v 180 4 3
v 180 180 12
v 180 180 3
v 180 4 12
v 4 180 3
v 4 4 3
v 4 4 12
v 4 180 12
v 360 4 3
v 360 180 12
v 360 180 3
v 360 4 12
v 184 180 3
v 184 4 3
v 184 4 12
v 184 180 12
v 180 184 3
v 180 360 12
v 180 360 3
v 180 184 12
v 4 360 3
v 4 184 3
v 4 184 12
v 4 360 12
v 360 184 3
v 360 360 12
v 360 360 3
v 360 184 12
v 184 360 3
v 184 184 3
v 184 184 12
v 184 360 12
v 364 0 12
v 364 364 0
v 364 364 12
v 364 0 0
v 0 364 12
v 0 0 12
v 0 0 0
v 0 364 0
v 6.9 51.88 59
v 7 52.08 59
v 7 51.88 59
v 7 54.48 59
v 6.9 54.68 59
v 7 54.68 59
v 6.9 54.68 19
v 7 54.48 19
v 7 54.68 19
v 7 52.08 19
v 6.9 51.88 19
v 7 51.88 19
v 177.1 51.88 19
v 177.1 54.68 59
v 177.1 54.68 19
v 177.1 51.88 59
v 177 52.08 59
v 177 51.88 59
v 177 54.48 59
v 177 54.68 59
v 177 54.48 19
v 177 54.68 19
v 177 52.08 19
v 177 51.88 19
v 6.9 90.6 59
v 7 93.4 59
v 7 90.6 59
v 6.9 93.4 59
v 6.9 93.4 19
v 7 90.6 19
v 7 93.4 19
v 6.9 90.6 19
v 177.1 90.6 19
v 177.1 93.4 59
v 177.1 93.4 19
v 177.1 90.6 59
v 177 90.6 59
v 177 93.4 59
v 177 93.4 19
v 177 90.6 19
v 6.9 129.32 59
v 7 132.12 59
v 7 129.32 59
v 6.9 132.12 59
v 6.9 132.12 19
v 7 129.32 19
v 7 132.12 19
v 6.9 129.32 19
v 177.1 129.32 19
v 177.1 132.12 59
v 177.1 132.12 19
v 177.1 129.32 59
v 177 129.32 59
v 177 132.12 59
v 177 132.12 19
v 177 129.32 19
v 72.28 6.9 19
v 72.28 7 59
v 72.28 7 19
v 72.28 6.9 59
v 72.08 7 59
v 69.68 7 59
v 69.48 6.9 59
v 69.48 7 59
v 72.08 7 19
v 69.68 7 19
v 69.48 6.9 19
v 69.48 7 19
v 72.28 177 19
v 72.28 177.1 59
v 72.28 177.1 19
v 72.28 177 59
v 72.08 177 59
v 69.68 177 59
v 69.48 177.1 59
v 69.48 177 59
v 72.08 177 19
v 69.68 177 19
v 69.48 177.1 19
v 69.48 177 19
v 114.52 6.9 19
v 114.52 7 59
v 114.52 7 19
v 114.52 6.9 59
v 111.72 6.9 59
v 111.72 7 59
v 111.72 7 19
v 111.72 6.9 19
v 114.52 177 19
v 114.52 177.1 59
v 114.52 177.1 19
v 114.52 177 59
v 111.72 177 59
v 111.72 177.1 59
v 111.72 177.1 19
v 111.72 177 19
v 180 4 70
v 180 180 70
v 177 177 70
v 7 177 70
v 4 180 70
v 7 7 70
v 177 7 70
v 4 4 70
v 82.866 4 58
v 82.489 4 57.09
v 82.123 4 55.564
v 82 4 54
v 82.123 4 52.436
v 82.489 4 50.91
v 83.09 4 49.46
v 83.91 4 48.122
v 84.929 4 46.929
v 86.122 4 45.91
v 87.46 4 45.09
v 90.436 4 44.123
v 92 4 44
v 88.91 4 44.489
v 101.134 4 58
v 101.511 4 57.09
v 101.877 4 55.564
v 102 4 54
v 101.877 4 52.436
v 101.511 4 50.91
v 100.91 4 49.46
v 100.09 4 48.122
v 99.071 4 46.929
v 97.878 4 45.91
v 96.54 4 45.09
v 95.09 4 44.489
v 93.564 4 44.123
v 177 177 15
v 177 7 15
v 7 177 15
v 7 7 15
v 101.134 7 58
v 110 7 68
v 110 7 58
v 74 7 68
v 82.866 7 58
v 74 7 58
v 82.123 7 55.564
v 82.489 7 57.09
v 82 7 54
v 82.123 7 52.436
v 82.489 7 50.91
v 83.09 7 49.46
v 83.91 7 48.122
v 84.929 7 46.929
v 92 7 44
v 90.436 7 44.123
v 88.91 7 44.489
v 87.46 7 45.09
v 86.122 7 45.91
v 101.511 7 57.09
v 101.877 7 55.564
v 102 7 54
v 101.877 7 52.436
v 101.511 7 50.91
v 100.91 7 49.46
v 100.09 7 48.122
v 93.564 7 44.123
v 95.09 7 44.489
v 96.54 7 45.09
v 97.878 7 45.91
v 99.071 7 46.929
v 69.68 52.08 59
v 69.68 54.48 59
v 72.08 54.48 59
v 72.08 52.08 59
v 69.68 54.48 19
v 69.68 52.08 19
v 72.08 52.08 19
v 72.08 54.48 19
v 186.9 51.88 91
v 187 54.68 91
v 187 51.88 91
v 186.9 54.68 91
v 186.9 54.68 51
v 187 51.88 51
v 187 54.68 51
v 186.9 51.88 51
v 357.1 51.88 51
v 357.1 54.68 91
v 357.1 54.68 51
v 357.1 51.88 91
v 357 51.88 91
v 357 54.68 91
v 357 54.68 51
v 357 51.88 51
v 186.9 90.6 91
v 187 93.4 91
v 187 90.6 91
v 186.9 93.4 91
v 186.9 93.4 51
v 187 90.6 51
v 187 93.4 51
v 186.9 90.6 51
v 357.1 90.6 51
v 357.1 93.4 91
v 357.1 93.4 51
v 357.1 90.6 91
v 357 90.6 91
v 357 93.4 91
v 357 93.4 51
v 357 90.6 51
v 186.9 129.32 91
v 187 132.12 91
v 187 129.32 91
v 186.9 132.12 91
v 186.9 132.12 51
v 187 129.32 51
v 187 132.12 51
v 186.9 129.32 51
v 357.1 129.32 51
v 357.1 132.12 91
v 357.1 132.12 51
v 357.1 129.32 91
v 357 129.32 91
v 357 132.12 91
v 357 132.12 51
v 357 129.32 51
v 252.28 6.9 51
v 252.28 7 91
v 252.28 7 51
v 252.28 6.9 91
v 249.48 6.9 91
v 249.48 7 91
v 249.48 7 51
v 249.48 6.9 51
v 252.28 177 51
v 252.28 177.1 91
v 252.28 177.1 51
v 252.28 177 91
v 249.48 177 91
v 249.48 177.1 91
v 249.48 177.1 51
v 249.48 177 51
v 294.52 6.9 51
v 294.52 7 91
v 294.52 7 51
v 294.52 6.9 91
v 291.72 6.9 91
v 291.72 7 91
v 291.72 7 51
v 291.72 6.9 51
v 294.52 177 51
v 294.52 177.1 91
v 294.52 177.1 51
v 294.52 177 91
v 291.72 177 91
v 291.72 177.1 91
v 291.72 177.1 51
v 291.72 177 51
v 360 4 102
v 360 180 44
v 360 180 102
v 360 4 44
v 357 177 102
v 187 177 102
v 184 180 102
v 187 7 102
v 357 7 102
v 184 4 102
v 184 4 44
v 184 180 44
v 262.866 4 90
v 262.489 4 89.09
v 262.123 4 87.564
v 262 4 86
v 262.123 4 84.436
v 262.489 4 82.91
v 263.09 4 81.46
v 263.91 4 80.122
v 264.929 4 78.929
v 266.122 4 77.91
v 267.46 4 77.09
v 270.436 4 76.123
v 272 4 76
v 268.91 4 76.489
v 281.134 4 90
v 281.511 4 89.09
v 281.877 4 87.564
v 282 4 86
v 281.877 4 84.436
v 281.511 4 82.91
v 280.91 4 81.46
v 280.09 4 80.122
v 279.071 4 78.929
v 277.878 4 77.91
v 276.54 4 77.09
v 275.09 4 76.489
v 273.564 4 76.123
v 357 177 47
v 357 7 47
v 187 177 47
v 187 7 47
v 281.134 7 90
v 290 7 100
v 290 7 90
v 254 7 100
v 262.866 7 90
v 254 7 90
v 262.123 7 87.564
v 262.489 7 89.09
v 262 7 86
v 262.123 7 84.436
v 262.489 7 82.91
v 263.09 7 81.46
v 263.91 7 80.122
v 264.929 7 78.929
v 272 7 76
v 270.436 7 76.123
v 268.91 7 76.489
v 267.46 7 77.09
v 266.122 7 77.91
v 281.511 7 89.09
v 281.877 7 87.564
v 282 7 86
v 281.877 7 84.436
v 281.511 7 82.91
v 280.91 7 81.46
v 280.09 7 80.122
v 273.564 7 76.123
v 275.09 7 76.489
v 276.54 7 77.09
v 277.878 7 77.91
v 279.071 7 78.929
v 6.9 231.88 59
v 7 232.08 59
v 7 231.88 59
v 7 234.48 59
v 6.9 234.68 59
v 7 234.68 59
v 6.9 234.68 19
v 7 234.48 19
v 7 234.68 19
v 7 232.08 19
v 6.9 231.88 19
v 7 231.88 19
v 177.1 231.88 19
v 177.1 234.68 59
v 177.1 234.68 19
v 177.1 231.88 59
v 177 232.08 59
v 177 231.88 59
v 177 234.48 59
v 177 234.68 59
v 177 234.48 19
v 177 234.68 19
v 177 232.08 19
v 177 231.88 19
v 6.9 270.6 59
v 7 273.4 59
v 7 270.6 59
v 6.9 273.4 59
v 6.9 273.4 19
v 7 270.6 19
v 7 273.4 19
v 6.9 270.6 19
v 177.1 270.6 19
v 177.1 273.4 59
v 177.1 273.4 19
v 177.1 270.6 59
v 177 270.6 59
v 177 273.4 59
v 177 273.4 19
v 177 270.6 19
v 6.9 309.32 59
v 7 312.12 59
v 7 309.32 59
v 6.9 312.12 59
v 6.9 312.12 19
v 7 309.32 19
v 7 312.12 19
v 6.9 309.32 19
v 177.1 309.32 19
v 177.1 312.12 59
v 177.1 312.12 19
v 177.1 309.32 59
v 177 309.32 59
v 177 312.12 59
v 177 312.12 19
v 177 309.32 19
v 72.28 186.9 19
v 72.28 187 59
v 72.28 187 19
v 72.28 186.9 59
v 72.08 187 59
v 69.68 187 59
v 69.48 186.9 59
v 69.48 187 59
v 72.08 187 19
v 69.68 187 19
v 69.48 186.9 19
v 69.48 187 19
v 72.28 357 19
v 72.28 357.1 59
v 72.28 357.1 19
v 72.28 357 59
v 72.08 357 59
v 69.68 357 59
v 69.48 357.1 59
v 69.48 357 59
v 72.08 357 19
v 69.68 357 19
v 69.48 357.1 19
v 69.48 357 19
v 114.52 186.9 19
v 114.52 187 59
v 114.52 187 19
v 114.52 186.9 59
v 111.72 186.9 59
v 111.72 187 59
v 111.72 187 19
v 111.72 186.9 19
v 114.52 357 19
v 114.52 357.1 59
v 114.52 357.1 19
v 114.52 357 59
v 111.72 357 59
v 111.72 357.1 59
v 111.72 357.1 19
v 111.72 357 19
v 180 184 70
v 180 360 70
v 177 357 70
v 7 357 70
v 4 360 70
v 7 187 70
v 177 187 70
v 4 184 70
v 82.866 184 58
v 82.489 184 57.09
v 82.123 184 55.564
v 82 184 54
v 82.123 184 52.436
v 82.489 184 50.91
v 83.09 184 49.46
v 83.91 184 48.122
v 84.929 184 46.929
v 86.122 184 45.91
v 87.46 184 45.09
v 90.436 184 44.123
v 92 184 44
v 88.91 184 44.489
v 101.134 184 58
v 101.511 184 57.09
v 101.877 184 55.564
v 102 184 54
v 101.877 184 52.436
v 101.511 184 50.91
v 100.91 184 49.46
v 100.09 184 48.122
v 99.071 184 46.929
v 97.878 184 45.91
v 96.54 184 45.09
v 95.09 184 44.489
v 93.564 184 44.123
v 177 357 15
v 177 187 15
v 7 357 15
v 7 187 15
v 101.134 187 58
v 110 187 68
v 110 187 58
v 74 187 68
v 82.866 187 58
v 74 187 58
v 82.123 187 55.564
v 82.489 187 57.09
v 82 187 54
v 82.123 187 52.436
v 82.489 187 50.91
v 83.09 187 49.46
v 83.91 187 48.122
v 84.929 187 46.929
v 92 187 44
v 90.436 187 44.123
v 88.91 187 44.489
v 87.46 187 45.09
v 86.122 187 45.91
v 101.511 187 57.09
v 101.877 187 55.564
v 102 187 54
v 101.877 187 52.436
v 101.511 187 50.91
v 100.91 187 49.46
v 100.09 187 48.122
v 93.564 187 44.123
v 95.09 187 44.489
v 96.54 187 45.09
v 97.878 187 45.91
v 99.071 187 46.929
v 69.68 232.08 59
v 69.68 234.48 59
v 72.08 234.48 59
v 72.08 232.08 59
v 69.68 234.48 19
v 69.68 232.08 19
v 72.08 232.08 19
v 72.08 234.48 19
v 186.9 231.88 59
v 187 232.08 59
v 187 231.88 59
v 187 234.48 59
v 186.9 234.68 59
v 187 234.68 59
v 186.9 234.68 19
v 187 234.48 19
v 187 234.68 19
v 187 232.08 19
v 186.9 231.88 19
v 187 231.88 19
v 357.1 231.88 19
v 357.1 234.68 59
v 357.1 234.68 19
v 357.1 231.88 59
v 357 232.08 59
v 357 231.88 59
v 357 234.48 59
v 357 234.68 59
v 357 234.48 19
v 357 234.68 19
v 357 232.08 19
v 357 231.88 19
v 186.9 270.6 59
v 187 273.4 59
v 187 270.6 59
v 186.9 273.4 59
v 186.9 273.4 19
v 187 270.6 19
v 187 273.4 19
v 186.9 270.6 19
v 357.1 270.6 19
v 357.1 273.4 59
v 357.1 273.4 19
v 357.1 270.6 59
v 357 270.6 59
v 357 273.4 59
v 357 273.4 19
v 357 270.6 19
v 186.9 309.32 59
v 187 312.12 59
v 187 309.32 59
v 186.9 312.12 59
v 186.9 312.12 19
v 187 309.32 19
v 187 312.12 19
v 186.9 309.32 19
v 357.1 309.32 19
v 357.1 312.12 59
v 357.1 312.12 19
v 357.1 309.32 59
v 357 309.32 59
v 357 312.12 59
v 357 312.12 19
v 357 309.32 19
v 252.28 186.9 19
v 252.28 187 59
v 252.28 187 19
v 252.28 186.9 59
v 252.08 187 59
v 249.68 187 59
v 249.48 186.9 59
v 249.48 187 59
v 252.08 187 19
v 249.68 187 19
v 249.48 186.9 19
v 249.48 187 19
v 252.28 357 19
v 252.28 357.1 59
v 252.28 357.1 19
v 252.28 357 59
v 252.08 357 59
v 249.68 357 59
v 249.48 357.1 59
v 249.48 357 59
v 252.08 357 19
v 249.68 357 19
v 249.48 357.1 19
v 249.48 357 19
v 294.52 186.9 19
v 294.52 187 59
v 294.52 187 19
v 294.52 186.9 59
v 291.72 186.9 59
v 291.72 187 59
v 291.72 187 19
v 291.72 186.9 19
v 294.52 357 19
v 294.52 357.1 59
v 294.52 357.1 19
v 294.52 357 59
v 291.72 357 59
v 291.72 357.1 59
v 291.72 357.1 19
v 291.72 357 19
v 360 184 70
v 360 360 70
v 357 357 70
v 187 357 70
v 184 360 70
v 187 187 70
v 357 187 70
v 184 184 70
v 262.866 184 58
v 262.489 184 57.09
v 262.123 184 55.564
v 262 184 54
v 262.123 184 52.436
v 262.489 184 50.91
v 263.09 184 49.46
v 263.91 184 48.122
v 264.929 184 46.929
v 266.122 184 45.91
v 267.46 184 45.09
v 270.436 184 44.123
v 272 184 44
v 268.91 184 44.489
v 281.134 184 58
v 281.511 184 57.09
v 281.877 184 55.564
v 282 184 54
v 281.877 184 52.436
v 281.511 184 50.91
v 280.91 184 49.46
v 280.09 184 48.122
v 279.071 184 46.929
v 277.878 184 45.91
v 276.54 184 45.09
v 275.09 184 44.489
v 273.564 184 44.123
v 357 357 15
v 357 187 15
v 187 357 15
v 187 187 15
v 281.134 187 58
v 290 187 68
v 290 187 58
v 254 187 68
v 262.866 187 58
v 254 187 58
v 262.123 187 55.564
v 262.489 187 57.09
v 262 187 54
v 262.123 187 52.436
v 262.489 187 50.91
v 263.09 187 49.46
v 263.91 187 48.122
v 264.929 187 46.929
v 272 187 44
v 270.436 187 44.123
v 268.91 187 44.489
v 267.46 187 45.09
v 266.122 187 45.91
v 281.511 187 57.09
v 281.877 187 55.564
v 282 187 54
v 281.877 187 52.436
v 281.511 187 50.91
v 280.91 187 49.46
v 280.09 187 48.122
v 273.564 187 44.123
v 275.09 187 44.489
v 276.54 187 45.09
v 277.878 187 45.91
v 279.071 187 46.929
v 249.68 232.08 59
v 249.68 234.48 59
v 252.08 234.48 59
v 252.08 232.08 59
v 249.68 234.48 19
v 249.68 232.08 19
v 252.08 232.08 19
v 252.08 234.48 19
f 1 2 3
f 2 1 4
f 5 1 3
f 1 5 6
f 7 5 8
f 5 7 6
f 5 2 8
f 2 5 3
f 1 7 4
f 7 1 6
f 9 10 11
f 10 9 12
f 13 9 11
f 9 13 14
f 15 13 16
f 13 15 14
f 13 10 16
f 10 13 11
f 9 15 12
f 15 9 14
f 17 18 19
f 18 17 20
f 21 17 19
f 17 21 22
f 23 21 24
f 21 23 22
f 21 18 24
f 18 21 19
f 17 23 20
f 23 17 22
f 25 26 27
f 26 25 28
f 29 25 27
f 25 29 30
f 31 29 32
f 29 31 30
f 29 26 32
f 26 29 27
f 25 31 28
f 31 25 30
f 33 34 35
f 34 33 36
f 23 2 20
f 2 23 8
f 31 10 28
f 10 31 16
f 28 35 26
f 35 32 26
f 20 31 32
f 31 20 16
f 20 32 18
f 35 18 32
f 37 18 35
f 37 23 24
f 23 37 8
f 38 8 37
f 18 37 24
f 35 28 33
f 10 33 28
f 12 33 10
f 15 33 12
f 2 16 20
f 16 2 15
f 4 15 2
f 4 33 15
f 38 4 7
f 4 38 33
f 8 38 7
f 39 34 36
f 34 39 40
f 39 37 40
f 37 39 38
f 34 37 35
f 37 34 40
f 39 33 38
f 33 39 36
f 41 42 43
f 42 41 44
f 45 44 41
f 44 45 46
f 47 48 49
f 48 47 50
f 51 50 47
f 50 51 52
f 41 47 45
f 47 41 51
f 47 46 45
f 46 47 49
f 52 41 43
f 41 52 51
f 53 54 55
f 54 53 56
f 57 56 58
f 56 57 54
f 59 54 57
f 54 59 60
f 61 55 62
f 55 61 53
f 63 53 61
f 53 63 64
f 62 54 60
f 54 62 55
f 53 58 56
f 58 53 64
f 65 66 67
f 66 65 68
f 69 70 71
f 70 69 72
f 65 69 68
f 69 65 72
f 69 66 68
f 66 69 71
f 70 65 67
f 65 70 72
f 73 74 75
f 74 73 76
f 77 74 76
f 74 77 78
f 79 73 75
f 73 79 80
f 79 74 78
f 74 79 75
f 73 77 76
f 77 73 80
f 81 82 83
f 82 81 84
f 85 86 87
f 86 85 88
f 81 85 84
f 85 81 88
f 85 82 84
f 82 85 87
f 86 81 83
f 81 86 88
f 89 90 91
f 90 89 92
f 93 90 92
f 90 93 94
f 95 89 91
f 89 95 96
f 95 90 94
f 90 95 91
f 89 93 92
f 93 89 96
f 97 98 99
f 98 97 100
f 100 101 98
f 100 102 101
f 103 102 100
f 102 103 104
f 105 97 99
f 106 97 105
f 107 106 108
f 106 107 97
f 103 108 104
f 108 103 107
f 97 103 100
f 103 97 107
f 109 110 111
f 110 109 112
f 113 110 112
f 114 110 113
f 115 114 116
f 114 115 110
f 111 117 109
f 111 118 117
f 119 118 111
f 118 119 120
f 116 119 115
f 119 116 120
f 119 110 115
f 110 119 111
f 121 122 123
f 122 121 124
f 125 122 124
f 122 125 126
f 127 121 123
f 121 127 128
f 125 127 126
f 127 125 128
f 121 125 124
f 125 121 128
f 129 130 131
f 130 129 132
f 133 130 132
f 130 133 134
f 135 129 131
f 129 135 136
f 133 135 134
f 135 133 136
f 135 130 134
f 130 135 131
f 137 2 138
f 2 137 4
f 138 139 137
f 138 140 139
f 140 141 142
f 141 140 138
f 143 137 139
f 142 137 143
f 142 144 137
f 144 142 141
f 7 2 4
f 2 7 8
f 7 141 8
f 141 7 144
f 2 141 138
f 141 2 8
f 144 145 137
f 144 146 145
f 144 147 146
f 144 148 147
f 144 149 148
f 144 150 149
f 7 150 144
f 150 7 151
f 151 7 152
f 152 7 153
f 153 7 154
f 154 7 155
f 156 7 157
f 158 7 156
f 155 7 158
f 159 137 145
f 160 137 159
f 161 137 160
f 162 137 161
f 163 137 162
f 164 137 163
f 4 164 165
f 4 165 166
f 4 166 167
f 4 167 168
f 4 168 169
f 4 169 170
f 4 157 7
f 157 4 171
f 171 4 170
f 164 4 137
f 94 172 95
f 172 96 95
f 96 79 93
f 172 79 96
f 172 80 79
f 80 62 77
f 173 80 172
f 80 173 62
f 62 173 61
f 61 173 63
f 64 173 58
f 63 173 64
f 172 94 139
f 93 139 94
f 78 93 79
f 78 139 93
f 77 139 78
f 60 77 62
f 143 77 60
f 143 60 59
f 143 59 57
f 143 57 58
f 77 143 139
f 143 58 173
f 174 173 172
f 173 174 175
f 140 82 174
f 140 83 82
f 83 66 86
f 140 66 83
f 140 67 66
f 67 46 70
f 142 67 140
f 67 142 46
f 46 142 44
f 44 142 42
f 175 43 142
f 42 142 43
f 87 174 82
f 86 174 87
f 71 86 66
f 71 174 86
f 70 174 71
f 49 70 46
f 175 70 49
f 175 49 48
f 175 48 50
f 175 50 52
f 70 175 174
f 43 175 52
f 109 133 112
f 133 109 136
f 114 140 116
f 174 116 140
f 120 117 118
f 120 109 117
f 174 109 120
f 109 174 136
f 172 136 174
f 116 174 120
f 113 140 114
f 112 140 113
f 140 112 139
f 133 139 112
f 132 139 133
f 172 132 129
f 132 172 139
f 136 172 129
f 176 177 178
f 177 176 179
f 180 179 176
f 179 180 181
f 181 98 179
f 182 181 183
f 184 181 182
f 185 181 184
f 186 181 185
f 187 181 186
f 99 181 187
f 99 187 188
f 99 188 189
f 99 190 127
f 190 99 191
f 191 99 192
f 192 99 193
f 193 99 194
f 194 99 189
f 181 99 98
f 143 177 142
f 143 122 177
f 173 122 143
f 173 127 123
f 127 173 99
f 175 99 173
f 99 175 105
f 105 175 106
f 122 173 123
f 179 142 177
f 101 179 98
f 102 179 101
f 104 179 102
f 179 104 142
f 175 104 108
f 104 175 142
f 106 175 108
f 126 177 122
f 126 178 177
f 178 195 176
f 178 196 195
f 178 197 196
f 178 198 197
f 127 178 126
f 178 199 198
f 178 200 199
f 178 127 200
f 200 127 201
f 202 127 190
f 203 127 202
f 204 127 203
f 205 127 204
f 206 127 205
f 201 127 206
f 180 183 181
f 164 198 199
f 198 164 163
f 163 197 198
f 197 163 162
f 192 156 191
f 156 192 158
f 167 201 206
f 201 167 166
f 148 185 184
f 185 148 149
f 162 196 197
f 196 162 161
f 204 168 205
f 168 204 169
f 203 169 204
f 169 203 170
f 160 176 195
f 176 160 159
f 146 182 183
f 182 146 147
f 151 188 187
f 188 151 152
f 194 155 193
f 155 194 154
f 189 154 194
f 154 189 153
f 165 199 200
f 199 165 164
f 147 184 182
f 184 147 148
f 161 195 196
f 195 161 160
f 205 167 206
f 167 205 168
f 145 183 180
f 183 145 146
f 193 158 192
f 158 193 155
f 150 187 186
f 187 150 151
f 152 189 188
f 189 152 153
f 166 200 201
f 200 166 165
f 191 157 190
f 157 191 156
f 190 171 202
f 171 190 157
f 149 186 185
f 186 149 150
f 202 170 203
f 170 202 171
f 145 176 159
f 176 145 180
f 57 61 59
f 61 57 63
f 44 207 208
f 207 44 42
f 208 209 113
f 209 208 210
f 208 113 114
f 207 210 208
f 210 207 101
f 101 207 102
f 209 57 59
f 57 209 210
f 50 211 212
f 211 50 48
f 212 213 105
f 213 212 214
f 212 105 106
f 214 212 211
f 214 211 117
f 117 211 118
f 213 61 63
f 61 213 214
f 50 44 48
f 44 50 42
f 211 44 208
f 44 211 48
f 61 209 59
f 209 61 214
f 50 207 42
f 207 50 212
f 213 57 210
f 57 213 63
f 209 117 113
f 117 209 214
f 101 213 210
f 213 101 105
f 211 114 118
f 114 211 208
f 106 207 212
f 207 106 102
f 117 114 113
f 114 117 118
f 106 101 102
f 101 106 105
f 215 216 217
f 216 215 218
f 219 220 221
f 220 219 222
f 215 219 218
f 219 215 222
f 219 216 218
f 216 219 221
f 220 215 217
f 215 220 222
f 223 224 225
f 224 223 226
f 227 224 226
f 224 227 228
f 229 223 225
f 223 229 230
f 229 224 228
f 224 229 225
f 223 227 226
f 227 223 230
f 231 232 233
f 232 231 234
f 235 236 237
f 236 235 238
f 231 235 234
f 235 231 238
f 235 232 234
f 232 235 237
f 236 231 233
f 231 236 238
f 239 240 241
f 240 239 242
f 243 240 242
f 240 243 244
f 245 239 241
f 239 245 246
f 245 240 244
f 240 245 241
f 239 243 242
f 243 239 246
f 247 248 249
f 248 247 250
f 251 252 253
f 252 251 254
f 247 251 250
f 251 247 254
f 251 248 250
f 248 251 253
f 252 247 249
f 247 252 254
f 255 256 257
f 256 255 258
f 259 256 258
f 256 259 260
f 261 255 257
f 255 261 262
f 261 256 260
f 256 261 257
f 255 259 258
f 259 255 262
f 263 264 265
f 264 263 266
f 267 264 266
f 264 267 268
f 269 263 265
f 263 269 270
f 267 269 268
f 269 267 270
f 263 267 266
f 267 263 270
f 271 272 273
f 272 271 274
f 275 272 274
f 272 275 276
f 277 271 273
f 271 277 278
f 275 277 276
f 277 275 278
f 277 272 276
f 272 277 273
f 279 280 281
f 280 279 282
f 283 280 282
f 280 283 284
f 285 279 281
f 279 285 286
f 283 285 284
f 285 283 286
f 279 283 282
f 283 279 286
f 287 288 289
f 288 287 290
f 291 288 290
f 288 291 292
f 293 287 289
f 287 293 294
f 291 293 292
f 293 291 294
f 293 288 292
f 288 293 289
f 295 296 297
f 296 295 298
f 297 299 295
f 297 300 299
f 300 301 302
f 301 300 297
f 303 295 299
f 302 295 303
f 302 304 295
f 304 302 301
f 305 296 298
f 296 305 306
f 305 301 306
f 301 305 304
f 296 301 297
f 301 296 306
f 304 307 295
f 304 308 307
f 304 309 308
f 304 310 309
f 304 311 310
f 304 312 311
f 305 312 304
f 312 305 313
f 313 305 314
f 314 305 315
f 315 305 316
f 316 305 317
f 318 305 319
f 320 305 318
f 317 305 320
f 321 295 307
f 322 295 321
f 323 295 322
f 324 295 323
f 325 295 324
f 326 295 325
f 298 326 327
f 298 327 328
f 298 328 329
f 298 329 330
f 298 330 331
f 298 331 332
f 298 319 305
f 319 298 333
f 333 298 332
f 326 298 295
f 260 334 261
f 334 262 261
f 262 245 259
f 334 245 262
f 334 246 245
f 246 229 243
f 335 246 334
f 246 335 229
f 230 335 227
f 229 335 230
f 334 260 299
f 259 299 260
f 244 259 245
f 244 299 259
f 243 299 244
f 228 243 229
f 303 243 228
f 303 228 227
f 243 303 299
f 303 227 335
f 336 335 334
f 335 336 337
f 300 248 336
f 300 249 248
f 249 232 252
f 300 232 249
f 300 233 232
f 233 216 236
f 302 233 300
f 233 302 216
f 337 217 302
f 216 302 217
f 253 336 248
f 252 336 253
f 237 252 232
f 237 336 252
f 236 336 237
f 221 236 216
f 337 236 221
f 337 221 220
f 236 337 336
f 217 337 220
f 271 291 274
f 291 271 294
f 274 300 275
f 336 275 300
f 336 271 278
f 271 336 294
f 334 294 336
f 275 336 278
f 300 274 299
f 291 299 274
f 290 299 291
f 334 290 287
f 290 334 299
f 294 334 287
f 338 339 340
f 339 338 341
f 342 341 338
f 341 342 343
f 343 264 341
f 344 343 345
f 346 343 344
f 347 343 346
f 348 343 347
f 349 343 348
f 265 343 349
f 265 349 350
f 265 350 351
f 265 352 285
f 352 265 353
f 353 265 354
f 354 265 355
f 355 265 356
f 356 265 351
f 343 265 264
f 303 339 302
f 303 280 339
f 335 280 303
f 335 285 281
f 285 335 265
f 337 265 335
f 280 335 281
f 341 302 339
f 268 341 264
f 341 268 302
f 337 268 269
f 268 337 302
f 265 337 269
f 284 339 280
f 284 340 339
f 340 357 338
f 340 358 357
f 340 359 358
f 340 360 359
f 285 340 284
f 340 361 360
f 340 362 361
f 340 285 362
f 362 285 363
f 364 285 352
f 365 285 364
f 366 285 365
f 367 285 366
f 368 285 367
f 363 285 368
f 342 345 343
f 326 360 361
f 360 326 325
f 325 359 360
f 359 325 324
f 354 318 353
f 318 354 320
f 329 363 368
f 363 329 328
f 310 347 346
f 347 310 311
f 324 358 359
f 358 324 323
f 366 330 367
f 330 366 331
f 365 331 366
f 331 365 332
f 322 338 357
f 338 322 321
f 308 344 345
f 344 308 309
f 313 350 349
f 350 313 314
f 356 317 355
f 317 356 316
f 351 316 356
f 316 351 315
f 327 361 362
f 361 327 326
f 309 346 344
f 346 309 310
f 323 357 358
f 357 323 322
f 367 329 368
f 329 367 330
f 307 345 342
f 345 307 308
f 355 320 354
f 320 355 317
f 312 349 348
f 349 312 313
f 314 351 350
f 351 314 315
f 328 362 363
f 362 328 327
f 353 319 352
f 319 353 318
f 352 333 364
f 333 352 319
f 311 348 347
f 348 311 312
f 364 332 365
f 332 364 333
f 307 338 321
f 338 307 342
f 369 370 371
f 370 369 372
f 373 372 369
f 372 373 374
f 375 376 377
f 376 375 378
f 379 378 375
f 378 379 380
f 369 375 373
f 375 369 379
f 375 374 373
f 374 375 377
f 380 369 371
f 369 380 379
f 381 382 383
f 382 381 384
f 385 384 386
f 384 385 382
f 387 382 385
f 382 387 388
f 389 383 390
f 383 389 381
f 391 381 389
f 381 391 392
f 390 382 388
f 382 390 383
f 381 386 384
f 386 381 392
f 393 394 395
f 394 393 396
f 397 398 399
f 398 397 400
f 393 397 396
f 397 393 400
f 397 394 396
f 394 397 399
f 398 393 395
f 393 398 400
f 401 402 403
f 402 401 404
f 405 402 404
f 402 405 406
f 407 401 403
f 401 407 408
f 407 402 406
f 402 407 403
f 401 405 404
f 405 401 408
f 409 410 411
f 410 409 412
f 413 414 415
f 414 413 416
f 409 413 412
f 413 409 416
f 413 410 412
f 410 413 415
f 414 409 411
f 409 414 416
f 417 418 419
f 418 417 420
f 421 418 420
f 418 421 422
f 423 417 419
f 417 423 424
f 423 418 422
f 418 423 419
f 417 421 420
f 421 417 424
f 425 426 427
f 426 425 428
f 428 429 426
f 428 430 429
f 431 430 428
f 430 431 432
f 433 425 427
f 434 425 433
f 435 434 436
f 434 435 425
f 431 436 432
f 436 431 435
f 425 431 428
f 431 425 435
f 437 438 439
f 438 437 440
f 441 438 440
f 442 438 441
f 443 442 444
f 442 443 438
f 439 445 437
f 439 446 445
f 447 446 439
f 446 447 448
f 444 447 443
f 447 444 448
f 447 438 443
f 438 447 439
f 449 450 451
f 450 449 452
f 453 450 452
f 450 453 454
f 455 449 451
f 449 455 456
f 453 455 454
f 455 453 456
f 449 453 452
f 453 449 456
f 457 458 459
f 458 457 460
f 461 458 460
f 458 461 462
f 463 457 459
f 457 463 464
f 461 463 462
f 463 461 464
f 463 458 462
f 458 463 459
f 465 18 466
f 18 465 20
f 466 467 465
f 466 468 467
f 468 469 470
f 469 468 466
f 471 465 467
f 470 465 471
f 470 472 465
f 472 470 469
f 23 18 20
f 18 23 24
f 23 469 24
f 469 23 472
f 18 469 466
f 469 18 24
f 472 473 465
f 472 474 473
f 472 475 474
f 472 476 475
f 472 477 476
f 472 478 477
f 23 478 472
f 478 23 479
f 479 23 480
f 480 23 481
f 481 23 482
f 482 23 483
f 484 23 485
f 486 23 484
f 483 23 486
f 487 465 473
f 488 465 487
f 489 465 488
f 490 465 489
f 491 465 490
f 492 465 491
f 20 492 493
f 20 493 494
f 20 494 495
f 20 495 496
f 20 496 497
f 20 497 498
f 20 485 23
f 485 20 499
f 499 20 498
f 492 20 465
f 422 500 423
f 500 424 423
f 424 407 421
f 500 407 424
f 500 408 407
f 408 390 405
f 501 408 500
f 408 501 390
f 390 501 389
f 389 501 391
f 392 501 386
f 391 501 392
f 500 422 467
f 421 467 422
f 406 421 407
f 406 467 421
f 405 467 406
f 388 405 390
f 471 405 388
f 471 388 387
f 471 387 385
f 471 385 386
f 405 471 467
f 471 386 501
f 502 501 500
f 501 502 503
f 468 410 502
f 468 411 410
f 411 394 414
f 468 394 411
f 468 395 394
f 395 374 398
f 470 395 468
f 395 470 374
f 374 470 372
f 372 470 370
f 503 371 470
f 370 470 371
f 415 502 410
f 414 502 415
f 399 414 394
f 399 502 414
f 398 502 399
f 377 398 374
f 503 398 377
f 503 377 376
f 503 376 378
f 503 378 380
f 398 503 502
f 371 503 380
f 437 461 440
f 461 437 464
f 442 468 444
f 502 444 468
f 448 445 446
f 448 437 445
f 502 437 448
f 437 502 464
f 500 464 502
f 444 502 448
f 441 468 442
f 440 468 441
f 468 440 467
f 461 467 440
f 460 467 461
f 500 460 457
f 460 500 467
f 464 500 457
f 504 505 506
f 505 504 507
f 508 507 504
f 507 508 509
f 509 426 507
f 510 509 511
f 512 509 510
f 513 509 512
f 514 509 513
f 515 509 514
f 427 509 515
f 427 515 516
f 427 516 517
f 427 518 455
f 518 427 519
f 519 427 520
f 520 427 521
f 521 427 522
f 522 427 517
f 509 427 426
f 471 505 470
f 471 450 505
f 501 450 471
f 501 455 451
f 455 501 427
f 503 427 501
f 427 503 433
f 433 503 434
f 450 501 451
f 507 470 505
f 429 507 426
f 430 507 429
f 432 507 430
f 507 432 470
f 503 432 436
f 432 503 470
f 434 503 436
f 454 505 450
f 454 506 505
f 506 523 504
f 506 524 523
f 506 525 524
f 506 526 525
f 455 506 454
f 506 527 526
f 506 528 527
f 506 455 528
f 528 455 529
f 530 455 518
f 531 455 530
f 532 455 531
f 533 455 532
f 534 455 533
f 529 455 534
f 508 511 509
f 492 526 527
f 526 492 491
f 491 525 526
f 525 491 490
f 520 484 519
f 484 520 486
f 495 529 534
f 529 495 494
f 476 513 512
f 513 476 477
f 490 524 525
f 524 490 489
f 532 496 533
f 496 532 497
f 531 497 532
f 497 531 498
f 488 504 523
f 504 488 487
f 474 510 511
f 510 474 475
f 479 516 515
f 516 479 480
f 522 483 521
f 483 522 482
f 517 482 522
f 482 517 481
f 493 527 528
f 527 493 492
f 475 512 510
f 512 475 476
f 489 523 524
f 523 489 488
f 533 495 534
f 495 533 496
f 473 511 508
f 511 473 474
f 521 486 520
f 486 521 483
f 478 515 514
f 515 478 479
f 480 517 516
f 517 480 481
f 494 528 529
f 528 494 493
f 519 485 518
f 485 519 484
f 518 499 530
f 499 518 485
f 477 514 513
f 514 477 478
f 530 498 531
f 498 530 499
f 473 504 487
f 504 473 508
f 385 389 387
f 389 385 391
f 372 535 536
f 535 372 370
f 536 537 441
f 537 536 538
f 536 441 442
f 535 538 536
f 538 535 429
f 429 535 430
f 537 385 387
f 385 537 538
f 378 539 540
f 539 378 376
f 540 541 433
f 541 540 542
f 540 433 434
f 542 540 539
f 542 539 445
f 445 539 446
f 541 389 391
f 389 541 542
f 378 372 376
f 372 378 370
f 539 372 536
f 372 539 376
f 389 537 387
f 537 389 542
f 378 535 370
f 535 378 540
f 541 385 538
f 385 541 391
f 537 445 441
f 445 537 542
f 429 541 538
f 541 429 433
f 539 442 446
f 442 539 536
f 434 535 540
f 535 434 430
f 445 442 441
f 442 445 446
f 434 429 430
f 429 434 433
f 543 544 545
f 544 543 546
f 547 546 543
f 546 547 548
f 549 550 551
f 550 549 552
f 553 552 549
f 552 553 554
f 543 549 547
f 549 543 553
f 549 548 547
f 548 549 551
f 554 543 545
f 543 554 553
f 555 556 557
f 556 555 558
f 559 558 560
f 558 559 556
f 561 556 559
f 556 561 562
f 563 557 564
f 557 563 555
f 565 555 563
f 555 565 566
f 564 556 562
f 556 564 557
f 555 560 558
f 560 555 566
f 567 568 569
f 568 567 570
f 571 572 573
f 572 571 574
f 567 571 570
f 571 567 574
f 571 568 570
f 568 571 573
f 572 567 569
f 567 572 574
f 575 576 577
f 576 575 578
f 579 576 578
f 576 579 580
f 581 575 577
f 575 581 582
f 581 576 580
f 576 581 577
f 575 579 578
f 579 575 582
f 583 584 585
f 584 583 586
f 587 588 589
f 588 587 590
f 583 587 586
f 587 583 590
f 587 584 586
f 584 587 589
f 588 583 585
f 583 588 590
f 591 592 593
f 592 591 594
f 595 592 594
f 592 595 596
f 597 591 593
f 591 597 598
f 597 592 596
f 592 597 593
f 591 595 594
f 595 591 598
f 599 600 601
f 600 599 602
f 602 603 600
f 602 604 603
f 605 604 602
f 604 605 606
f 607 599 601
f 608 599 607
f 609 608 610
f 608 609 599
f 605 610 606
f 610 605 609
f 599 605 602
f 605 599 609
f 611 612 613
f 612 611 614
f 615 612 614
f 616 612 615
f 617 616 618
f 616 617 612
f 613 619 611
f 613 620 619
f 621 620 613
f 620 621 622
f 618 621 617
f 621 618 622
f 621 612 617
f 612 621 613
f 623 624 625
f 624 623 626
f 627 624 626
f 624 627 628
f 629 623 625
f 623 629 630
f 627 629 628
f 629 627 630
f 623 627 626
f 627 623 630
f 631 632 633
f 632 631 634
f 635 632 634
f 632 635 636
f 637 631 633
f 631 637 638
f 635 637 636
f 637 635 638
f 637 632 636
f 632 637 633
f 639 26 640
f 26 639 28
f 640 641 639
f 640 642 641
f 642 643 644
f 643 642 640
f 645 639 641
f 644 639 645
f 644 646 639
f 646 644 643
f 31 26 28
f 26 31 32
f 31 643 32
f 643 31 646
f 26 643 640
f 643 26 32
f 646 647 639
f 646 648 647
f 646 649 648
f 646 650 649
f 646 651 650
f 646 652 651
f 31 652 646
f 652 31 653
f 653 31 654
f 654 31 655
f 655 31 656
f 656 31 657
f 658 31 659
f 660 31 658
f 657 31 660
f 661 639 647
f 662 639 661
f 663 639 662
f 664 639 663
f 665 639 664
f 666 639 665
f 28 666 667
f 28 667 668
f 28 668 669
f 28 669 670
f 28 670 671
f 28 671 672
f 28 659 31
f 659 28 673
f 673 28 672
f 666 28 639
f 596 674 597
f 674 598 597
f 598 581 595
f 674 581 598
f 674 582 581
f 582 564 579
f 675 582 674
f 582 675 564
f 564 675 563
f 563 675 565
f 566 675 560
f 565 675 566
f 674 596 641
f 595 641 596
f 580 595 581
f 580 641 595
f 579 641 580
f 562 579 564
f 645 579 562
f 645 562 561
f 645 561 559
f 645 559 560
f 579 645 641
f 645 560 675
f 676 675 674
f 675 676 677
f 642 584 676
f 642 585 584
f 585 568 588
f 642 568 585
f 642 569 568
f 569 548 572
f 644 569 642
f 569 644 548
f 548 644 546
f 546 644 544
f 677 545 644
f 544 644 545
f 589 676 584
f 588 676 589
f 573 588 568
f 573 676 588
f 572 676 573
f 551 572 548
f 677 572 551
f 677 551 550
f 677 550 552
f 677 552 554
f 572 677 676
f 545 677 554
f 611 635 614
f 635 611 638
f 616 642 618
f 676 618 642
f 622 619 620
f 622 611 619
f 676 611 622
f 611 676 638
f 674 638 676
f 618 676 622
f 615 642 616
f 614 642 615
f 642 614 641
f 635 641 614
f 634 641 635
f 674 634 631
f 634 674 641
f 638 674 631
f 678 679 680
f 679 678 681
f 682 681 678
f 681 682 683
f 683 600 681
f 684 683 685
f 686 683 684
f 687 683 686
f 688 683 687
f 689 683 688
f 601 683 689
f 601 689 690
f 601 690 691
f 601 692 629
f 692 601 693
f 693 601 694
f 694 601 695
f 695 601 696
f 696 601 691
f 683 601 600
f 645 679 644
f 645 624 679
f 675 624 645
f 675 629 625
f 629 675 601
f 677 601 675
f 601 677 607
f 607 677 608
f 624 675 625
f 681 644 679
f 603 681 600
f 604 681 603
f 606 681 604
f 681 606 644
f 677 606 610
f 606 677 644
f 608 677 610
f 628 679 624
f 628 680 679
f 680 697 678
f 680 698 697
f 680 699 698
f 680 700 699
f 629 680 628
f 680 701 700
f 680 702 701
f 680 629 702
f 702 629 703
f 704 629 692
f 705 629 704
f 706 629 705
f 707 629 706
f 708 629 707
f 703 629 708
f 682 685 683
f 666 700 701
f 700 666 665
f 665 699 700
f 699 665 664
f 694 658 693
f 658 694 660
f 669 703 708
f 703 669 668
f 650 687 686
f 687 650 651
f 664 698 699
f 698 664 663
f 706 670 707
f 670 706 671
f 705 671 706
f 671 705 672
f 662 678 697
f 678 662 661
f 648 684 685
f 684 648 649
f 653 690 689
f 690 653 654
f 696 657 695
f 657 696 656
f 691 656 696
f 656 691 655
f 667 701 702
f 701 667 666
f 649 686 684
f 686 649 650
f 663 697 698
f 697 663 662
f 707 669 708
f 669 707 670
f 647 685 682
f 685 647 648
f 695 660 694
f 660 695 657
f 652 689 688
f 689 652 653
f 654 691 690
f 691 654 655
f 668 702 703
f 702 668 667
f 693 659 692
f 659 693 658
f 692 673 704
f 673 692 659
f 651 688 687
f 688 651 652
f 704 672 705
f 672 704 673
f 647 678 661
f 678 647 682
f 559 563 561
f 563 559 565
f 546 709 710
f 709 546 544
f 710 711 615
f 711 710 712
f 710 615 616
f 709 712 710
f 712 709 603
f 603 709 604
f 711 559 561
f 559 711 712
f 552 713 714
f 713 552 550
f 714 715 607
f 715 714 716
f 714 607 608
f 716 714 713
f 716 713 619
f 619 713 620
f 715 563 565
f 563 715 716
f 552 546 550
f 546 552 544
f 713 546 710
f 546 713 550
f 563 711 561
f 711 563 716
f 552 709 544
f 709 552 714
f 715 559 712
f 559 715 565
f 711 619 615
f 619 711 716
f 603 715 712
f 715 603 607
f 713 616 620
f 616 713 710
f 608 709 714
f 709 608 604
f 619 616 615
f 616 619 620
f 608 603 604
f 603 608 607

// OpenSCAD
// 03 — Bento trays with removable dividers (slots moulded in)
// Outer envelope: 372×372×66 mm
// Split: 2 large bento trays (180×180) per row, 2 rows → each tray 176×176 ≤ 240 mm
//        dividers are 172×2×40 mm sticks (trivially printable)
// $fn set externally

$fn = $fn > 0 ? $fn : 40;

WALL      = 3;
TRAY_W    = 176;
TRAY_D    = 176;
TRAY_H    = 58;
FRAME_GAP = 4;
FRAME_WALL= 4;
COLS = 2; ROWS = 2;

FRAME_W = COLS*TRAY_W + (COLS-1)*FRAME_GAP + 2*FRAME_WALL;  // 372
FRAME_D = ROWS*TRAY_D + (ROWS-1)*FRAME_GAP + 2*FRAME_WALL;
FRAME_H = 12;

DIV_T = 2.4;   // divider thickness
DIV_H = 40;    // divider height (sits inside tray)
SLOT_W = DIV_T + 0.4; // slot width with clearance

EXPLODE_Z = 32;

module fc() { color([0.40,0.60,0.75,1]) children(); }
module tc() { color([0.95,0.85,0.55,1]) children(); }
module dc() { color([0.75,0.55,0.85,1]) children(); }

// ── Base frame ───────────────────────────────────────────────
module base_frame() {
    fc() difference() {
        cube([FRAME_W, FRAME_D, FRAME_H]);
        for (r=[0:ROWS-1]) for (c=[0:COLS-1]) {
            x = FRAME_WALL + c*(TRAY_W + FRAME_GAP);
            y = FRAME_WALL + r*(TRAY_D + FRAME_GAP);
            translate([x, y, WALL]) cube([TRAY_W, TRAY_D, FRAME_H]);
        }
    }
}

// ── Divider slots moulded into tray walls ────────────────────
// slots on the long (X) walls: 3 slots per wall for 4 X-divisions
// slots on the short (Y) walls: 2 slots per wall for 3 Y-divisions
module slot_cuts_x(tw, td, th, wt) {
    positions = [td*0.28, td*0.50, td*0.72];
    for (py=positions) {
        // left wall slot
        translate([wt-0.1, py-SLOT_W/2, wt+4])
            cube([SLOT_W+0.2, SLOT_W, DIV_H]);
        // right wall slot
        translate([tw-wt-SLOT_W-0.1, py-SLOT_W/2, wt+4])
            cube([SLOT_W+0.2, SLOT_W, DIV_H]);
    }
}
module slot_cuts_y(tw, td, th, wt) {
    positions = [tw*0.38, tw*0.62];
    for (px=positions) {
        translate([px-SLOT_W/2, wt-0.1, wt+4])
            cube([SLOT_W, SLOT_W+0.2, DIV_H]);
        translate([px-SLOT_W/2, td-wt-SLOT_W-0.1, wt+4])
            cube([SLOT_W, SLOT_W+0.2, DIV_H]);
    }
}

// ── Single bento tray body ────────────────────────────────────
module bento_tray(lifted=false) {
    ez = lifted ? FRAME_H + EXPLODE_Z : FRAME_H;
    tc() translate([0,0,ez]) {
        difference() {
            cube([TRAY_W, TRAY_D, TRAY_H]);
            translate([WALL, WALL, WALL]) cube([TRAY_W-2*WALL, TRAY_D-2*WALL, TRAY_H]);
            slot_cuts_x(TRAY_W, TRAY_D, TRAY_H, WALL);
            slot_cuts_y(TRAY_W, TRAY_D, TRAY_H, WALL);
            // front finger scoop
            translate([TRAY_W/2, -1, TRAY_H-16])
                rotate([-90,0,0]) cylinder(d=20, h=WALL+2);
        }
        // label ledge on front
        translate([TRAY_W/2-18, 0, TRAY_H-12]) cube([36, WALL, 10]);
    }
}

// ── X-direction divider stick ─────────────────────────────────
module divider_x(lifted=false) {
    ez = lifted ? FRAME_H + EXPLODE_Z : FRAME_H;
    dc() translate([WALL, 0, ez]) {
        translate([0, TRAY_D*0.28 - DIV_T/2, WALL+4])
            cube([TRAY_W-2*WALL, DIV_T, DIV_H]);
    }
}

// ── Y-direction divider stick ─────────────────────────────────
module divider_y(lifted=false) {
    ez = lifted ? FRAME_H + EXPLODE_Z : FRAME_H;
    dc() translate([0, WALL, ez]) {
        translate([TRAY_W*0.38-DIV_T/2, 0, WALL+4])
            cube([DIV_T, TRAY_D-2*WALL, DIV_H]);
    }
}

// ── Assembly ─────────────────────────────────────────────────
base_frame();

for (r=[0:ROWS-1]) for (c=[0:COLS-1]) {
    tx = FRAME_WALL + c*(TRAY_W + FRAME_GAP);
    ty = FRAME_WALL + r*(TRAY_D + FRAME_GAP);
    lifted = (r==0 && c==1);
    translate([tx, ty, 0]) {
        bento_tray(lifted=lifted);
        if (!lifted) {
            divider_x(lifted=false);
            divider_y(lifted=false);
        }
    }
}
